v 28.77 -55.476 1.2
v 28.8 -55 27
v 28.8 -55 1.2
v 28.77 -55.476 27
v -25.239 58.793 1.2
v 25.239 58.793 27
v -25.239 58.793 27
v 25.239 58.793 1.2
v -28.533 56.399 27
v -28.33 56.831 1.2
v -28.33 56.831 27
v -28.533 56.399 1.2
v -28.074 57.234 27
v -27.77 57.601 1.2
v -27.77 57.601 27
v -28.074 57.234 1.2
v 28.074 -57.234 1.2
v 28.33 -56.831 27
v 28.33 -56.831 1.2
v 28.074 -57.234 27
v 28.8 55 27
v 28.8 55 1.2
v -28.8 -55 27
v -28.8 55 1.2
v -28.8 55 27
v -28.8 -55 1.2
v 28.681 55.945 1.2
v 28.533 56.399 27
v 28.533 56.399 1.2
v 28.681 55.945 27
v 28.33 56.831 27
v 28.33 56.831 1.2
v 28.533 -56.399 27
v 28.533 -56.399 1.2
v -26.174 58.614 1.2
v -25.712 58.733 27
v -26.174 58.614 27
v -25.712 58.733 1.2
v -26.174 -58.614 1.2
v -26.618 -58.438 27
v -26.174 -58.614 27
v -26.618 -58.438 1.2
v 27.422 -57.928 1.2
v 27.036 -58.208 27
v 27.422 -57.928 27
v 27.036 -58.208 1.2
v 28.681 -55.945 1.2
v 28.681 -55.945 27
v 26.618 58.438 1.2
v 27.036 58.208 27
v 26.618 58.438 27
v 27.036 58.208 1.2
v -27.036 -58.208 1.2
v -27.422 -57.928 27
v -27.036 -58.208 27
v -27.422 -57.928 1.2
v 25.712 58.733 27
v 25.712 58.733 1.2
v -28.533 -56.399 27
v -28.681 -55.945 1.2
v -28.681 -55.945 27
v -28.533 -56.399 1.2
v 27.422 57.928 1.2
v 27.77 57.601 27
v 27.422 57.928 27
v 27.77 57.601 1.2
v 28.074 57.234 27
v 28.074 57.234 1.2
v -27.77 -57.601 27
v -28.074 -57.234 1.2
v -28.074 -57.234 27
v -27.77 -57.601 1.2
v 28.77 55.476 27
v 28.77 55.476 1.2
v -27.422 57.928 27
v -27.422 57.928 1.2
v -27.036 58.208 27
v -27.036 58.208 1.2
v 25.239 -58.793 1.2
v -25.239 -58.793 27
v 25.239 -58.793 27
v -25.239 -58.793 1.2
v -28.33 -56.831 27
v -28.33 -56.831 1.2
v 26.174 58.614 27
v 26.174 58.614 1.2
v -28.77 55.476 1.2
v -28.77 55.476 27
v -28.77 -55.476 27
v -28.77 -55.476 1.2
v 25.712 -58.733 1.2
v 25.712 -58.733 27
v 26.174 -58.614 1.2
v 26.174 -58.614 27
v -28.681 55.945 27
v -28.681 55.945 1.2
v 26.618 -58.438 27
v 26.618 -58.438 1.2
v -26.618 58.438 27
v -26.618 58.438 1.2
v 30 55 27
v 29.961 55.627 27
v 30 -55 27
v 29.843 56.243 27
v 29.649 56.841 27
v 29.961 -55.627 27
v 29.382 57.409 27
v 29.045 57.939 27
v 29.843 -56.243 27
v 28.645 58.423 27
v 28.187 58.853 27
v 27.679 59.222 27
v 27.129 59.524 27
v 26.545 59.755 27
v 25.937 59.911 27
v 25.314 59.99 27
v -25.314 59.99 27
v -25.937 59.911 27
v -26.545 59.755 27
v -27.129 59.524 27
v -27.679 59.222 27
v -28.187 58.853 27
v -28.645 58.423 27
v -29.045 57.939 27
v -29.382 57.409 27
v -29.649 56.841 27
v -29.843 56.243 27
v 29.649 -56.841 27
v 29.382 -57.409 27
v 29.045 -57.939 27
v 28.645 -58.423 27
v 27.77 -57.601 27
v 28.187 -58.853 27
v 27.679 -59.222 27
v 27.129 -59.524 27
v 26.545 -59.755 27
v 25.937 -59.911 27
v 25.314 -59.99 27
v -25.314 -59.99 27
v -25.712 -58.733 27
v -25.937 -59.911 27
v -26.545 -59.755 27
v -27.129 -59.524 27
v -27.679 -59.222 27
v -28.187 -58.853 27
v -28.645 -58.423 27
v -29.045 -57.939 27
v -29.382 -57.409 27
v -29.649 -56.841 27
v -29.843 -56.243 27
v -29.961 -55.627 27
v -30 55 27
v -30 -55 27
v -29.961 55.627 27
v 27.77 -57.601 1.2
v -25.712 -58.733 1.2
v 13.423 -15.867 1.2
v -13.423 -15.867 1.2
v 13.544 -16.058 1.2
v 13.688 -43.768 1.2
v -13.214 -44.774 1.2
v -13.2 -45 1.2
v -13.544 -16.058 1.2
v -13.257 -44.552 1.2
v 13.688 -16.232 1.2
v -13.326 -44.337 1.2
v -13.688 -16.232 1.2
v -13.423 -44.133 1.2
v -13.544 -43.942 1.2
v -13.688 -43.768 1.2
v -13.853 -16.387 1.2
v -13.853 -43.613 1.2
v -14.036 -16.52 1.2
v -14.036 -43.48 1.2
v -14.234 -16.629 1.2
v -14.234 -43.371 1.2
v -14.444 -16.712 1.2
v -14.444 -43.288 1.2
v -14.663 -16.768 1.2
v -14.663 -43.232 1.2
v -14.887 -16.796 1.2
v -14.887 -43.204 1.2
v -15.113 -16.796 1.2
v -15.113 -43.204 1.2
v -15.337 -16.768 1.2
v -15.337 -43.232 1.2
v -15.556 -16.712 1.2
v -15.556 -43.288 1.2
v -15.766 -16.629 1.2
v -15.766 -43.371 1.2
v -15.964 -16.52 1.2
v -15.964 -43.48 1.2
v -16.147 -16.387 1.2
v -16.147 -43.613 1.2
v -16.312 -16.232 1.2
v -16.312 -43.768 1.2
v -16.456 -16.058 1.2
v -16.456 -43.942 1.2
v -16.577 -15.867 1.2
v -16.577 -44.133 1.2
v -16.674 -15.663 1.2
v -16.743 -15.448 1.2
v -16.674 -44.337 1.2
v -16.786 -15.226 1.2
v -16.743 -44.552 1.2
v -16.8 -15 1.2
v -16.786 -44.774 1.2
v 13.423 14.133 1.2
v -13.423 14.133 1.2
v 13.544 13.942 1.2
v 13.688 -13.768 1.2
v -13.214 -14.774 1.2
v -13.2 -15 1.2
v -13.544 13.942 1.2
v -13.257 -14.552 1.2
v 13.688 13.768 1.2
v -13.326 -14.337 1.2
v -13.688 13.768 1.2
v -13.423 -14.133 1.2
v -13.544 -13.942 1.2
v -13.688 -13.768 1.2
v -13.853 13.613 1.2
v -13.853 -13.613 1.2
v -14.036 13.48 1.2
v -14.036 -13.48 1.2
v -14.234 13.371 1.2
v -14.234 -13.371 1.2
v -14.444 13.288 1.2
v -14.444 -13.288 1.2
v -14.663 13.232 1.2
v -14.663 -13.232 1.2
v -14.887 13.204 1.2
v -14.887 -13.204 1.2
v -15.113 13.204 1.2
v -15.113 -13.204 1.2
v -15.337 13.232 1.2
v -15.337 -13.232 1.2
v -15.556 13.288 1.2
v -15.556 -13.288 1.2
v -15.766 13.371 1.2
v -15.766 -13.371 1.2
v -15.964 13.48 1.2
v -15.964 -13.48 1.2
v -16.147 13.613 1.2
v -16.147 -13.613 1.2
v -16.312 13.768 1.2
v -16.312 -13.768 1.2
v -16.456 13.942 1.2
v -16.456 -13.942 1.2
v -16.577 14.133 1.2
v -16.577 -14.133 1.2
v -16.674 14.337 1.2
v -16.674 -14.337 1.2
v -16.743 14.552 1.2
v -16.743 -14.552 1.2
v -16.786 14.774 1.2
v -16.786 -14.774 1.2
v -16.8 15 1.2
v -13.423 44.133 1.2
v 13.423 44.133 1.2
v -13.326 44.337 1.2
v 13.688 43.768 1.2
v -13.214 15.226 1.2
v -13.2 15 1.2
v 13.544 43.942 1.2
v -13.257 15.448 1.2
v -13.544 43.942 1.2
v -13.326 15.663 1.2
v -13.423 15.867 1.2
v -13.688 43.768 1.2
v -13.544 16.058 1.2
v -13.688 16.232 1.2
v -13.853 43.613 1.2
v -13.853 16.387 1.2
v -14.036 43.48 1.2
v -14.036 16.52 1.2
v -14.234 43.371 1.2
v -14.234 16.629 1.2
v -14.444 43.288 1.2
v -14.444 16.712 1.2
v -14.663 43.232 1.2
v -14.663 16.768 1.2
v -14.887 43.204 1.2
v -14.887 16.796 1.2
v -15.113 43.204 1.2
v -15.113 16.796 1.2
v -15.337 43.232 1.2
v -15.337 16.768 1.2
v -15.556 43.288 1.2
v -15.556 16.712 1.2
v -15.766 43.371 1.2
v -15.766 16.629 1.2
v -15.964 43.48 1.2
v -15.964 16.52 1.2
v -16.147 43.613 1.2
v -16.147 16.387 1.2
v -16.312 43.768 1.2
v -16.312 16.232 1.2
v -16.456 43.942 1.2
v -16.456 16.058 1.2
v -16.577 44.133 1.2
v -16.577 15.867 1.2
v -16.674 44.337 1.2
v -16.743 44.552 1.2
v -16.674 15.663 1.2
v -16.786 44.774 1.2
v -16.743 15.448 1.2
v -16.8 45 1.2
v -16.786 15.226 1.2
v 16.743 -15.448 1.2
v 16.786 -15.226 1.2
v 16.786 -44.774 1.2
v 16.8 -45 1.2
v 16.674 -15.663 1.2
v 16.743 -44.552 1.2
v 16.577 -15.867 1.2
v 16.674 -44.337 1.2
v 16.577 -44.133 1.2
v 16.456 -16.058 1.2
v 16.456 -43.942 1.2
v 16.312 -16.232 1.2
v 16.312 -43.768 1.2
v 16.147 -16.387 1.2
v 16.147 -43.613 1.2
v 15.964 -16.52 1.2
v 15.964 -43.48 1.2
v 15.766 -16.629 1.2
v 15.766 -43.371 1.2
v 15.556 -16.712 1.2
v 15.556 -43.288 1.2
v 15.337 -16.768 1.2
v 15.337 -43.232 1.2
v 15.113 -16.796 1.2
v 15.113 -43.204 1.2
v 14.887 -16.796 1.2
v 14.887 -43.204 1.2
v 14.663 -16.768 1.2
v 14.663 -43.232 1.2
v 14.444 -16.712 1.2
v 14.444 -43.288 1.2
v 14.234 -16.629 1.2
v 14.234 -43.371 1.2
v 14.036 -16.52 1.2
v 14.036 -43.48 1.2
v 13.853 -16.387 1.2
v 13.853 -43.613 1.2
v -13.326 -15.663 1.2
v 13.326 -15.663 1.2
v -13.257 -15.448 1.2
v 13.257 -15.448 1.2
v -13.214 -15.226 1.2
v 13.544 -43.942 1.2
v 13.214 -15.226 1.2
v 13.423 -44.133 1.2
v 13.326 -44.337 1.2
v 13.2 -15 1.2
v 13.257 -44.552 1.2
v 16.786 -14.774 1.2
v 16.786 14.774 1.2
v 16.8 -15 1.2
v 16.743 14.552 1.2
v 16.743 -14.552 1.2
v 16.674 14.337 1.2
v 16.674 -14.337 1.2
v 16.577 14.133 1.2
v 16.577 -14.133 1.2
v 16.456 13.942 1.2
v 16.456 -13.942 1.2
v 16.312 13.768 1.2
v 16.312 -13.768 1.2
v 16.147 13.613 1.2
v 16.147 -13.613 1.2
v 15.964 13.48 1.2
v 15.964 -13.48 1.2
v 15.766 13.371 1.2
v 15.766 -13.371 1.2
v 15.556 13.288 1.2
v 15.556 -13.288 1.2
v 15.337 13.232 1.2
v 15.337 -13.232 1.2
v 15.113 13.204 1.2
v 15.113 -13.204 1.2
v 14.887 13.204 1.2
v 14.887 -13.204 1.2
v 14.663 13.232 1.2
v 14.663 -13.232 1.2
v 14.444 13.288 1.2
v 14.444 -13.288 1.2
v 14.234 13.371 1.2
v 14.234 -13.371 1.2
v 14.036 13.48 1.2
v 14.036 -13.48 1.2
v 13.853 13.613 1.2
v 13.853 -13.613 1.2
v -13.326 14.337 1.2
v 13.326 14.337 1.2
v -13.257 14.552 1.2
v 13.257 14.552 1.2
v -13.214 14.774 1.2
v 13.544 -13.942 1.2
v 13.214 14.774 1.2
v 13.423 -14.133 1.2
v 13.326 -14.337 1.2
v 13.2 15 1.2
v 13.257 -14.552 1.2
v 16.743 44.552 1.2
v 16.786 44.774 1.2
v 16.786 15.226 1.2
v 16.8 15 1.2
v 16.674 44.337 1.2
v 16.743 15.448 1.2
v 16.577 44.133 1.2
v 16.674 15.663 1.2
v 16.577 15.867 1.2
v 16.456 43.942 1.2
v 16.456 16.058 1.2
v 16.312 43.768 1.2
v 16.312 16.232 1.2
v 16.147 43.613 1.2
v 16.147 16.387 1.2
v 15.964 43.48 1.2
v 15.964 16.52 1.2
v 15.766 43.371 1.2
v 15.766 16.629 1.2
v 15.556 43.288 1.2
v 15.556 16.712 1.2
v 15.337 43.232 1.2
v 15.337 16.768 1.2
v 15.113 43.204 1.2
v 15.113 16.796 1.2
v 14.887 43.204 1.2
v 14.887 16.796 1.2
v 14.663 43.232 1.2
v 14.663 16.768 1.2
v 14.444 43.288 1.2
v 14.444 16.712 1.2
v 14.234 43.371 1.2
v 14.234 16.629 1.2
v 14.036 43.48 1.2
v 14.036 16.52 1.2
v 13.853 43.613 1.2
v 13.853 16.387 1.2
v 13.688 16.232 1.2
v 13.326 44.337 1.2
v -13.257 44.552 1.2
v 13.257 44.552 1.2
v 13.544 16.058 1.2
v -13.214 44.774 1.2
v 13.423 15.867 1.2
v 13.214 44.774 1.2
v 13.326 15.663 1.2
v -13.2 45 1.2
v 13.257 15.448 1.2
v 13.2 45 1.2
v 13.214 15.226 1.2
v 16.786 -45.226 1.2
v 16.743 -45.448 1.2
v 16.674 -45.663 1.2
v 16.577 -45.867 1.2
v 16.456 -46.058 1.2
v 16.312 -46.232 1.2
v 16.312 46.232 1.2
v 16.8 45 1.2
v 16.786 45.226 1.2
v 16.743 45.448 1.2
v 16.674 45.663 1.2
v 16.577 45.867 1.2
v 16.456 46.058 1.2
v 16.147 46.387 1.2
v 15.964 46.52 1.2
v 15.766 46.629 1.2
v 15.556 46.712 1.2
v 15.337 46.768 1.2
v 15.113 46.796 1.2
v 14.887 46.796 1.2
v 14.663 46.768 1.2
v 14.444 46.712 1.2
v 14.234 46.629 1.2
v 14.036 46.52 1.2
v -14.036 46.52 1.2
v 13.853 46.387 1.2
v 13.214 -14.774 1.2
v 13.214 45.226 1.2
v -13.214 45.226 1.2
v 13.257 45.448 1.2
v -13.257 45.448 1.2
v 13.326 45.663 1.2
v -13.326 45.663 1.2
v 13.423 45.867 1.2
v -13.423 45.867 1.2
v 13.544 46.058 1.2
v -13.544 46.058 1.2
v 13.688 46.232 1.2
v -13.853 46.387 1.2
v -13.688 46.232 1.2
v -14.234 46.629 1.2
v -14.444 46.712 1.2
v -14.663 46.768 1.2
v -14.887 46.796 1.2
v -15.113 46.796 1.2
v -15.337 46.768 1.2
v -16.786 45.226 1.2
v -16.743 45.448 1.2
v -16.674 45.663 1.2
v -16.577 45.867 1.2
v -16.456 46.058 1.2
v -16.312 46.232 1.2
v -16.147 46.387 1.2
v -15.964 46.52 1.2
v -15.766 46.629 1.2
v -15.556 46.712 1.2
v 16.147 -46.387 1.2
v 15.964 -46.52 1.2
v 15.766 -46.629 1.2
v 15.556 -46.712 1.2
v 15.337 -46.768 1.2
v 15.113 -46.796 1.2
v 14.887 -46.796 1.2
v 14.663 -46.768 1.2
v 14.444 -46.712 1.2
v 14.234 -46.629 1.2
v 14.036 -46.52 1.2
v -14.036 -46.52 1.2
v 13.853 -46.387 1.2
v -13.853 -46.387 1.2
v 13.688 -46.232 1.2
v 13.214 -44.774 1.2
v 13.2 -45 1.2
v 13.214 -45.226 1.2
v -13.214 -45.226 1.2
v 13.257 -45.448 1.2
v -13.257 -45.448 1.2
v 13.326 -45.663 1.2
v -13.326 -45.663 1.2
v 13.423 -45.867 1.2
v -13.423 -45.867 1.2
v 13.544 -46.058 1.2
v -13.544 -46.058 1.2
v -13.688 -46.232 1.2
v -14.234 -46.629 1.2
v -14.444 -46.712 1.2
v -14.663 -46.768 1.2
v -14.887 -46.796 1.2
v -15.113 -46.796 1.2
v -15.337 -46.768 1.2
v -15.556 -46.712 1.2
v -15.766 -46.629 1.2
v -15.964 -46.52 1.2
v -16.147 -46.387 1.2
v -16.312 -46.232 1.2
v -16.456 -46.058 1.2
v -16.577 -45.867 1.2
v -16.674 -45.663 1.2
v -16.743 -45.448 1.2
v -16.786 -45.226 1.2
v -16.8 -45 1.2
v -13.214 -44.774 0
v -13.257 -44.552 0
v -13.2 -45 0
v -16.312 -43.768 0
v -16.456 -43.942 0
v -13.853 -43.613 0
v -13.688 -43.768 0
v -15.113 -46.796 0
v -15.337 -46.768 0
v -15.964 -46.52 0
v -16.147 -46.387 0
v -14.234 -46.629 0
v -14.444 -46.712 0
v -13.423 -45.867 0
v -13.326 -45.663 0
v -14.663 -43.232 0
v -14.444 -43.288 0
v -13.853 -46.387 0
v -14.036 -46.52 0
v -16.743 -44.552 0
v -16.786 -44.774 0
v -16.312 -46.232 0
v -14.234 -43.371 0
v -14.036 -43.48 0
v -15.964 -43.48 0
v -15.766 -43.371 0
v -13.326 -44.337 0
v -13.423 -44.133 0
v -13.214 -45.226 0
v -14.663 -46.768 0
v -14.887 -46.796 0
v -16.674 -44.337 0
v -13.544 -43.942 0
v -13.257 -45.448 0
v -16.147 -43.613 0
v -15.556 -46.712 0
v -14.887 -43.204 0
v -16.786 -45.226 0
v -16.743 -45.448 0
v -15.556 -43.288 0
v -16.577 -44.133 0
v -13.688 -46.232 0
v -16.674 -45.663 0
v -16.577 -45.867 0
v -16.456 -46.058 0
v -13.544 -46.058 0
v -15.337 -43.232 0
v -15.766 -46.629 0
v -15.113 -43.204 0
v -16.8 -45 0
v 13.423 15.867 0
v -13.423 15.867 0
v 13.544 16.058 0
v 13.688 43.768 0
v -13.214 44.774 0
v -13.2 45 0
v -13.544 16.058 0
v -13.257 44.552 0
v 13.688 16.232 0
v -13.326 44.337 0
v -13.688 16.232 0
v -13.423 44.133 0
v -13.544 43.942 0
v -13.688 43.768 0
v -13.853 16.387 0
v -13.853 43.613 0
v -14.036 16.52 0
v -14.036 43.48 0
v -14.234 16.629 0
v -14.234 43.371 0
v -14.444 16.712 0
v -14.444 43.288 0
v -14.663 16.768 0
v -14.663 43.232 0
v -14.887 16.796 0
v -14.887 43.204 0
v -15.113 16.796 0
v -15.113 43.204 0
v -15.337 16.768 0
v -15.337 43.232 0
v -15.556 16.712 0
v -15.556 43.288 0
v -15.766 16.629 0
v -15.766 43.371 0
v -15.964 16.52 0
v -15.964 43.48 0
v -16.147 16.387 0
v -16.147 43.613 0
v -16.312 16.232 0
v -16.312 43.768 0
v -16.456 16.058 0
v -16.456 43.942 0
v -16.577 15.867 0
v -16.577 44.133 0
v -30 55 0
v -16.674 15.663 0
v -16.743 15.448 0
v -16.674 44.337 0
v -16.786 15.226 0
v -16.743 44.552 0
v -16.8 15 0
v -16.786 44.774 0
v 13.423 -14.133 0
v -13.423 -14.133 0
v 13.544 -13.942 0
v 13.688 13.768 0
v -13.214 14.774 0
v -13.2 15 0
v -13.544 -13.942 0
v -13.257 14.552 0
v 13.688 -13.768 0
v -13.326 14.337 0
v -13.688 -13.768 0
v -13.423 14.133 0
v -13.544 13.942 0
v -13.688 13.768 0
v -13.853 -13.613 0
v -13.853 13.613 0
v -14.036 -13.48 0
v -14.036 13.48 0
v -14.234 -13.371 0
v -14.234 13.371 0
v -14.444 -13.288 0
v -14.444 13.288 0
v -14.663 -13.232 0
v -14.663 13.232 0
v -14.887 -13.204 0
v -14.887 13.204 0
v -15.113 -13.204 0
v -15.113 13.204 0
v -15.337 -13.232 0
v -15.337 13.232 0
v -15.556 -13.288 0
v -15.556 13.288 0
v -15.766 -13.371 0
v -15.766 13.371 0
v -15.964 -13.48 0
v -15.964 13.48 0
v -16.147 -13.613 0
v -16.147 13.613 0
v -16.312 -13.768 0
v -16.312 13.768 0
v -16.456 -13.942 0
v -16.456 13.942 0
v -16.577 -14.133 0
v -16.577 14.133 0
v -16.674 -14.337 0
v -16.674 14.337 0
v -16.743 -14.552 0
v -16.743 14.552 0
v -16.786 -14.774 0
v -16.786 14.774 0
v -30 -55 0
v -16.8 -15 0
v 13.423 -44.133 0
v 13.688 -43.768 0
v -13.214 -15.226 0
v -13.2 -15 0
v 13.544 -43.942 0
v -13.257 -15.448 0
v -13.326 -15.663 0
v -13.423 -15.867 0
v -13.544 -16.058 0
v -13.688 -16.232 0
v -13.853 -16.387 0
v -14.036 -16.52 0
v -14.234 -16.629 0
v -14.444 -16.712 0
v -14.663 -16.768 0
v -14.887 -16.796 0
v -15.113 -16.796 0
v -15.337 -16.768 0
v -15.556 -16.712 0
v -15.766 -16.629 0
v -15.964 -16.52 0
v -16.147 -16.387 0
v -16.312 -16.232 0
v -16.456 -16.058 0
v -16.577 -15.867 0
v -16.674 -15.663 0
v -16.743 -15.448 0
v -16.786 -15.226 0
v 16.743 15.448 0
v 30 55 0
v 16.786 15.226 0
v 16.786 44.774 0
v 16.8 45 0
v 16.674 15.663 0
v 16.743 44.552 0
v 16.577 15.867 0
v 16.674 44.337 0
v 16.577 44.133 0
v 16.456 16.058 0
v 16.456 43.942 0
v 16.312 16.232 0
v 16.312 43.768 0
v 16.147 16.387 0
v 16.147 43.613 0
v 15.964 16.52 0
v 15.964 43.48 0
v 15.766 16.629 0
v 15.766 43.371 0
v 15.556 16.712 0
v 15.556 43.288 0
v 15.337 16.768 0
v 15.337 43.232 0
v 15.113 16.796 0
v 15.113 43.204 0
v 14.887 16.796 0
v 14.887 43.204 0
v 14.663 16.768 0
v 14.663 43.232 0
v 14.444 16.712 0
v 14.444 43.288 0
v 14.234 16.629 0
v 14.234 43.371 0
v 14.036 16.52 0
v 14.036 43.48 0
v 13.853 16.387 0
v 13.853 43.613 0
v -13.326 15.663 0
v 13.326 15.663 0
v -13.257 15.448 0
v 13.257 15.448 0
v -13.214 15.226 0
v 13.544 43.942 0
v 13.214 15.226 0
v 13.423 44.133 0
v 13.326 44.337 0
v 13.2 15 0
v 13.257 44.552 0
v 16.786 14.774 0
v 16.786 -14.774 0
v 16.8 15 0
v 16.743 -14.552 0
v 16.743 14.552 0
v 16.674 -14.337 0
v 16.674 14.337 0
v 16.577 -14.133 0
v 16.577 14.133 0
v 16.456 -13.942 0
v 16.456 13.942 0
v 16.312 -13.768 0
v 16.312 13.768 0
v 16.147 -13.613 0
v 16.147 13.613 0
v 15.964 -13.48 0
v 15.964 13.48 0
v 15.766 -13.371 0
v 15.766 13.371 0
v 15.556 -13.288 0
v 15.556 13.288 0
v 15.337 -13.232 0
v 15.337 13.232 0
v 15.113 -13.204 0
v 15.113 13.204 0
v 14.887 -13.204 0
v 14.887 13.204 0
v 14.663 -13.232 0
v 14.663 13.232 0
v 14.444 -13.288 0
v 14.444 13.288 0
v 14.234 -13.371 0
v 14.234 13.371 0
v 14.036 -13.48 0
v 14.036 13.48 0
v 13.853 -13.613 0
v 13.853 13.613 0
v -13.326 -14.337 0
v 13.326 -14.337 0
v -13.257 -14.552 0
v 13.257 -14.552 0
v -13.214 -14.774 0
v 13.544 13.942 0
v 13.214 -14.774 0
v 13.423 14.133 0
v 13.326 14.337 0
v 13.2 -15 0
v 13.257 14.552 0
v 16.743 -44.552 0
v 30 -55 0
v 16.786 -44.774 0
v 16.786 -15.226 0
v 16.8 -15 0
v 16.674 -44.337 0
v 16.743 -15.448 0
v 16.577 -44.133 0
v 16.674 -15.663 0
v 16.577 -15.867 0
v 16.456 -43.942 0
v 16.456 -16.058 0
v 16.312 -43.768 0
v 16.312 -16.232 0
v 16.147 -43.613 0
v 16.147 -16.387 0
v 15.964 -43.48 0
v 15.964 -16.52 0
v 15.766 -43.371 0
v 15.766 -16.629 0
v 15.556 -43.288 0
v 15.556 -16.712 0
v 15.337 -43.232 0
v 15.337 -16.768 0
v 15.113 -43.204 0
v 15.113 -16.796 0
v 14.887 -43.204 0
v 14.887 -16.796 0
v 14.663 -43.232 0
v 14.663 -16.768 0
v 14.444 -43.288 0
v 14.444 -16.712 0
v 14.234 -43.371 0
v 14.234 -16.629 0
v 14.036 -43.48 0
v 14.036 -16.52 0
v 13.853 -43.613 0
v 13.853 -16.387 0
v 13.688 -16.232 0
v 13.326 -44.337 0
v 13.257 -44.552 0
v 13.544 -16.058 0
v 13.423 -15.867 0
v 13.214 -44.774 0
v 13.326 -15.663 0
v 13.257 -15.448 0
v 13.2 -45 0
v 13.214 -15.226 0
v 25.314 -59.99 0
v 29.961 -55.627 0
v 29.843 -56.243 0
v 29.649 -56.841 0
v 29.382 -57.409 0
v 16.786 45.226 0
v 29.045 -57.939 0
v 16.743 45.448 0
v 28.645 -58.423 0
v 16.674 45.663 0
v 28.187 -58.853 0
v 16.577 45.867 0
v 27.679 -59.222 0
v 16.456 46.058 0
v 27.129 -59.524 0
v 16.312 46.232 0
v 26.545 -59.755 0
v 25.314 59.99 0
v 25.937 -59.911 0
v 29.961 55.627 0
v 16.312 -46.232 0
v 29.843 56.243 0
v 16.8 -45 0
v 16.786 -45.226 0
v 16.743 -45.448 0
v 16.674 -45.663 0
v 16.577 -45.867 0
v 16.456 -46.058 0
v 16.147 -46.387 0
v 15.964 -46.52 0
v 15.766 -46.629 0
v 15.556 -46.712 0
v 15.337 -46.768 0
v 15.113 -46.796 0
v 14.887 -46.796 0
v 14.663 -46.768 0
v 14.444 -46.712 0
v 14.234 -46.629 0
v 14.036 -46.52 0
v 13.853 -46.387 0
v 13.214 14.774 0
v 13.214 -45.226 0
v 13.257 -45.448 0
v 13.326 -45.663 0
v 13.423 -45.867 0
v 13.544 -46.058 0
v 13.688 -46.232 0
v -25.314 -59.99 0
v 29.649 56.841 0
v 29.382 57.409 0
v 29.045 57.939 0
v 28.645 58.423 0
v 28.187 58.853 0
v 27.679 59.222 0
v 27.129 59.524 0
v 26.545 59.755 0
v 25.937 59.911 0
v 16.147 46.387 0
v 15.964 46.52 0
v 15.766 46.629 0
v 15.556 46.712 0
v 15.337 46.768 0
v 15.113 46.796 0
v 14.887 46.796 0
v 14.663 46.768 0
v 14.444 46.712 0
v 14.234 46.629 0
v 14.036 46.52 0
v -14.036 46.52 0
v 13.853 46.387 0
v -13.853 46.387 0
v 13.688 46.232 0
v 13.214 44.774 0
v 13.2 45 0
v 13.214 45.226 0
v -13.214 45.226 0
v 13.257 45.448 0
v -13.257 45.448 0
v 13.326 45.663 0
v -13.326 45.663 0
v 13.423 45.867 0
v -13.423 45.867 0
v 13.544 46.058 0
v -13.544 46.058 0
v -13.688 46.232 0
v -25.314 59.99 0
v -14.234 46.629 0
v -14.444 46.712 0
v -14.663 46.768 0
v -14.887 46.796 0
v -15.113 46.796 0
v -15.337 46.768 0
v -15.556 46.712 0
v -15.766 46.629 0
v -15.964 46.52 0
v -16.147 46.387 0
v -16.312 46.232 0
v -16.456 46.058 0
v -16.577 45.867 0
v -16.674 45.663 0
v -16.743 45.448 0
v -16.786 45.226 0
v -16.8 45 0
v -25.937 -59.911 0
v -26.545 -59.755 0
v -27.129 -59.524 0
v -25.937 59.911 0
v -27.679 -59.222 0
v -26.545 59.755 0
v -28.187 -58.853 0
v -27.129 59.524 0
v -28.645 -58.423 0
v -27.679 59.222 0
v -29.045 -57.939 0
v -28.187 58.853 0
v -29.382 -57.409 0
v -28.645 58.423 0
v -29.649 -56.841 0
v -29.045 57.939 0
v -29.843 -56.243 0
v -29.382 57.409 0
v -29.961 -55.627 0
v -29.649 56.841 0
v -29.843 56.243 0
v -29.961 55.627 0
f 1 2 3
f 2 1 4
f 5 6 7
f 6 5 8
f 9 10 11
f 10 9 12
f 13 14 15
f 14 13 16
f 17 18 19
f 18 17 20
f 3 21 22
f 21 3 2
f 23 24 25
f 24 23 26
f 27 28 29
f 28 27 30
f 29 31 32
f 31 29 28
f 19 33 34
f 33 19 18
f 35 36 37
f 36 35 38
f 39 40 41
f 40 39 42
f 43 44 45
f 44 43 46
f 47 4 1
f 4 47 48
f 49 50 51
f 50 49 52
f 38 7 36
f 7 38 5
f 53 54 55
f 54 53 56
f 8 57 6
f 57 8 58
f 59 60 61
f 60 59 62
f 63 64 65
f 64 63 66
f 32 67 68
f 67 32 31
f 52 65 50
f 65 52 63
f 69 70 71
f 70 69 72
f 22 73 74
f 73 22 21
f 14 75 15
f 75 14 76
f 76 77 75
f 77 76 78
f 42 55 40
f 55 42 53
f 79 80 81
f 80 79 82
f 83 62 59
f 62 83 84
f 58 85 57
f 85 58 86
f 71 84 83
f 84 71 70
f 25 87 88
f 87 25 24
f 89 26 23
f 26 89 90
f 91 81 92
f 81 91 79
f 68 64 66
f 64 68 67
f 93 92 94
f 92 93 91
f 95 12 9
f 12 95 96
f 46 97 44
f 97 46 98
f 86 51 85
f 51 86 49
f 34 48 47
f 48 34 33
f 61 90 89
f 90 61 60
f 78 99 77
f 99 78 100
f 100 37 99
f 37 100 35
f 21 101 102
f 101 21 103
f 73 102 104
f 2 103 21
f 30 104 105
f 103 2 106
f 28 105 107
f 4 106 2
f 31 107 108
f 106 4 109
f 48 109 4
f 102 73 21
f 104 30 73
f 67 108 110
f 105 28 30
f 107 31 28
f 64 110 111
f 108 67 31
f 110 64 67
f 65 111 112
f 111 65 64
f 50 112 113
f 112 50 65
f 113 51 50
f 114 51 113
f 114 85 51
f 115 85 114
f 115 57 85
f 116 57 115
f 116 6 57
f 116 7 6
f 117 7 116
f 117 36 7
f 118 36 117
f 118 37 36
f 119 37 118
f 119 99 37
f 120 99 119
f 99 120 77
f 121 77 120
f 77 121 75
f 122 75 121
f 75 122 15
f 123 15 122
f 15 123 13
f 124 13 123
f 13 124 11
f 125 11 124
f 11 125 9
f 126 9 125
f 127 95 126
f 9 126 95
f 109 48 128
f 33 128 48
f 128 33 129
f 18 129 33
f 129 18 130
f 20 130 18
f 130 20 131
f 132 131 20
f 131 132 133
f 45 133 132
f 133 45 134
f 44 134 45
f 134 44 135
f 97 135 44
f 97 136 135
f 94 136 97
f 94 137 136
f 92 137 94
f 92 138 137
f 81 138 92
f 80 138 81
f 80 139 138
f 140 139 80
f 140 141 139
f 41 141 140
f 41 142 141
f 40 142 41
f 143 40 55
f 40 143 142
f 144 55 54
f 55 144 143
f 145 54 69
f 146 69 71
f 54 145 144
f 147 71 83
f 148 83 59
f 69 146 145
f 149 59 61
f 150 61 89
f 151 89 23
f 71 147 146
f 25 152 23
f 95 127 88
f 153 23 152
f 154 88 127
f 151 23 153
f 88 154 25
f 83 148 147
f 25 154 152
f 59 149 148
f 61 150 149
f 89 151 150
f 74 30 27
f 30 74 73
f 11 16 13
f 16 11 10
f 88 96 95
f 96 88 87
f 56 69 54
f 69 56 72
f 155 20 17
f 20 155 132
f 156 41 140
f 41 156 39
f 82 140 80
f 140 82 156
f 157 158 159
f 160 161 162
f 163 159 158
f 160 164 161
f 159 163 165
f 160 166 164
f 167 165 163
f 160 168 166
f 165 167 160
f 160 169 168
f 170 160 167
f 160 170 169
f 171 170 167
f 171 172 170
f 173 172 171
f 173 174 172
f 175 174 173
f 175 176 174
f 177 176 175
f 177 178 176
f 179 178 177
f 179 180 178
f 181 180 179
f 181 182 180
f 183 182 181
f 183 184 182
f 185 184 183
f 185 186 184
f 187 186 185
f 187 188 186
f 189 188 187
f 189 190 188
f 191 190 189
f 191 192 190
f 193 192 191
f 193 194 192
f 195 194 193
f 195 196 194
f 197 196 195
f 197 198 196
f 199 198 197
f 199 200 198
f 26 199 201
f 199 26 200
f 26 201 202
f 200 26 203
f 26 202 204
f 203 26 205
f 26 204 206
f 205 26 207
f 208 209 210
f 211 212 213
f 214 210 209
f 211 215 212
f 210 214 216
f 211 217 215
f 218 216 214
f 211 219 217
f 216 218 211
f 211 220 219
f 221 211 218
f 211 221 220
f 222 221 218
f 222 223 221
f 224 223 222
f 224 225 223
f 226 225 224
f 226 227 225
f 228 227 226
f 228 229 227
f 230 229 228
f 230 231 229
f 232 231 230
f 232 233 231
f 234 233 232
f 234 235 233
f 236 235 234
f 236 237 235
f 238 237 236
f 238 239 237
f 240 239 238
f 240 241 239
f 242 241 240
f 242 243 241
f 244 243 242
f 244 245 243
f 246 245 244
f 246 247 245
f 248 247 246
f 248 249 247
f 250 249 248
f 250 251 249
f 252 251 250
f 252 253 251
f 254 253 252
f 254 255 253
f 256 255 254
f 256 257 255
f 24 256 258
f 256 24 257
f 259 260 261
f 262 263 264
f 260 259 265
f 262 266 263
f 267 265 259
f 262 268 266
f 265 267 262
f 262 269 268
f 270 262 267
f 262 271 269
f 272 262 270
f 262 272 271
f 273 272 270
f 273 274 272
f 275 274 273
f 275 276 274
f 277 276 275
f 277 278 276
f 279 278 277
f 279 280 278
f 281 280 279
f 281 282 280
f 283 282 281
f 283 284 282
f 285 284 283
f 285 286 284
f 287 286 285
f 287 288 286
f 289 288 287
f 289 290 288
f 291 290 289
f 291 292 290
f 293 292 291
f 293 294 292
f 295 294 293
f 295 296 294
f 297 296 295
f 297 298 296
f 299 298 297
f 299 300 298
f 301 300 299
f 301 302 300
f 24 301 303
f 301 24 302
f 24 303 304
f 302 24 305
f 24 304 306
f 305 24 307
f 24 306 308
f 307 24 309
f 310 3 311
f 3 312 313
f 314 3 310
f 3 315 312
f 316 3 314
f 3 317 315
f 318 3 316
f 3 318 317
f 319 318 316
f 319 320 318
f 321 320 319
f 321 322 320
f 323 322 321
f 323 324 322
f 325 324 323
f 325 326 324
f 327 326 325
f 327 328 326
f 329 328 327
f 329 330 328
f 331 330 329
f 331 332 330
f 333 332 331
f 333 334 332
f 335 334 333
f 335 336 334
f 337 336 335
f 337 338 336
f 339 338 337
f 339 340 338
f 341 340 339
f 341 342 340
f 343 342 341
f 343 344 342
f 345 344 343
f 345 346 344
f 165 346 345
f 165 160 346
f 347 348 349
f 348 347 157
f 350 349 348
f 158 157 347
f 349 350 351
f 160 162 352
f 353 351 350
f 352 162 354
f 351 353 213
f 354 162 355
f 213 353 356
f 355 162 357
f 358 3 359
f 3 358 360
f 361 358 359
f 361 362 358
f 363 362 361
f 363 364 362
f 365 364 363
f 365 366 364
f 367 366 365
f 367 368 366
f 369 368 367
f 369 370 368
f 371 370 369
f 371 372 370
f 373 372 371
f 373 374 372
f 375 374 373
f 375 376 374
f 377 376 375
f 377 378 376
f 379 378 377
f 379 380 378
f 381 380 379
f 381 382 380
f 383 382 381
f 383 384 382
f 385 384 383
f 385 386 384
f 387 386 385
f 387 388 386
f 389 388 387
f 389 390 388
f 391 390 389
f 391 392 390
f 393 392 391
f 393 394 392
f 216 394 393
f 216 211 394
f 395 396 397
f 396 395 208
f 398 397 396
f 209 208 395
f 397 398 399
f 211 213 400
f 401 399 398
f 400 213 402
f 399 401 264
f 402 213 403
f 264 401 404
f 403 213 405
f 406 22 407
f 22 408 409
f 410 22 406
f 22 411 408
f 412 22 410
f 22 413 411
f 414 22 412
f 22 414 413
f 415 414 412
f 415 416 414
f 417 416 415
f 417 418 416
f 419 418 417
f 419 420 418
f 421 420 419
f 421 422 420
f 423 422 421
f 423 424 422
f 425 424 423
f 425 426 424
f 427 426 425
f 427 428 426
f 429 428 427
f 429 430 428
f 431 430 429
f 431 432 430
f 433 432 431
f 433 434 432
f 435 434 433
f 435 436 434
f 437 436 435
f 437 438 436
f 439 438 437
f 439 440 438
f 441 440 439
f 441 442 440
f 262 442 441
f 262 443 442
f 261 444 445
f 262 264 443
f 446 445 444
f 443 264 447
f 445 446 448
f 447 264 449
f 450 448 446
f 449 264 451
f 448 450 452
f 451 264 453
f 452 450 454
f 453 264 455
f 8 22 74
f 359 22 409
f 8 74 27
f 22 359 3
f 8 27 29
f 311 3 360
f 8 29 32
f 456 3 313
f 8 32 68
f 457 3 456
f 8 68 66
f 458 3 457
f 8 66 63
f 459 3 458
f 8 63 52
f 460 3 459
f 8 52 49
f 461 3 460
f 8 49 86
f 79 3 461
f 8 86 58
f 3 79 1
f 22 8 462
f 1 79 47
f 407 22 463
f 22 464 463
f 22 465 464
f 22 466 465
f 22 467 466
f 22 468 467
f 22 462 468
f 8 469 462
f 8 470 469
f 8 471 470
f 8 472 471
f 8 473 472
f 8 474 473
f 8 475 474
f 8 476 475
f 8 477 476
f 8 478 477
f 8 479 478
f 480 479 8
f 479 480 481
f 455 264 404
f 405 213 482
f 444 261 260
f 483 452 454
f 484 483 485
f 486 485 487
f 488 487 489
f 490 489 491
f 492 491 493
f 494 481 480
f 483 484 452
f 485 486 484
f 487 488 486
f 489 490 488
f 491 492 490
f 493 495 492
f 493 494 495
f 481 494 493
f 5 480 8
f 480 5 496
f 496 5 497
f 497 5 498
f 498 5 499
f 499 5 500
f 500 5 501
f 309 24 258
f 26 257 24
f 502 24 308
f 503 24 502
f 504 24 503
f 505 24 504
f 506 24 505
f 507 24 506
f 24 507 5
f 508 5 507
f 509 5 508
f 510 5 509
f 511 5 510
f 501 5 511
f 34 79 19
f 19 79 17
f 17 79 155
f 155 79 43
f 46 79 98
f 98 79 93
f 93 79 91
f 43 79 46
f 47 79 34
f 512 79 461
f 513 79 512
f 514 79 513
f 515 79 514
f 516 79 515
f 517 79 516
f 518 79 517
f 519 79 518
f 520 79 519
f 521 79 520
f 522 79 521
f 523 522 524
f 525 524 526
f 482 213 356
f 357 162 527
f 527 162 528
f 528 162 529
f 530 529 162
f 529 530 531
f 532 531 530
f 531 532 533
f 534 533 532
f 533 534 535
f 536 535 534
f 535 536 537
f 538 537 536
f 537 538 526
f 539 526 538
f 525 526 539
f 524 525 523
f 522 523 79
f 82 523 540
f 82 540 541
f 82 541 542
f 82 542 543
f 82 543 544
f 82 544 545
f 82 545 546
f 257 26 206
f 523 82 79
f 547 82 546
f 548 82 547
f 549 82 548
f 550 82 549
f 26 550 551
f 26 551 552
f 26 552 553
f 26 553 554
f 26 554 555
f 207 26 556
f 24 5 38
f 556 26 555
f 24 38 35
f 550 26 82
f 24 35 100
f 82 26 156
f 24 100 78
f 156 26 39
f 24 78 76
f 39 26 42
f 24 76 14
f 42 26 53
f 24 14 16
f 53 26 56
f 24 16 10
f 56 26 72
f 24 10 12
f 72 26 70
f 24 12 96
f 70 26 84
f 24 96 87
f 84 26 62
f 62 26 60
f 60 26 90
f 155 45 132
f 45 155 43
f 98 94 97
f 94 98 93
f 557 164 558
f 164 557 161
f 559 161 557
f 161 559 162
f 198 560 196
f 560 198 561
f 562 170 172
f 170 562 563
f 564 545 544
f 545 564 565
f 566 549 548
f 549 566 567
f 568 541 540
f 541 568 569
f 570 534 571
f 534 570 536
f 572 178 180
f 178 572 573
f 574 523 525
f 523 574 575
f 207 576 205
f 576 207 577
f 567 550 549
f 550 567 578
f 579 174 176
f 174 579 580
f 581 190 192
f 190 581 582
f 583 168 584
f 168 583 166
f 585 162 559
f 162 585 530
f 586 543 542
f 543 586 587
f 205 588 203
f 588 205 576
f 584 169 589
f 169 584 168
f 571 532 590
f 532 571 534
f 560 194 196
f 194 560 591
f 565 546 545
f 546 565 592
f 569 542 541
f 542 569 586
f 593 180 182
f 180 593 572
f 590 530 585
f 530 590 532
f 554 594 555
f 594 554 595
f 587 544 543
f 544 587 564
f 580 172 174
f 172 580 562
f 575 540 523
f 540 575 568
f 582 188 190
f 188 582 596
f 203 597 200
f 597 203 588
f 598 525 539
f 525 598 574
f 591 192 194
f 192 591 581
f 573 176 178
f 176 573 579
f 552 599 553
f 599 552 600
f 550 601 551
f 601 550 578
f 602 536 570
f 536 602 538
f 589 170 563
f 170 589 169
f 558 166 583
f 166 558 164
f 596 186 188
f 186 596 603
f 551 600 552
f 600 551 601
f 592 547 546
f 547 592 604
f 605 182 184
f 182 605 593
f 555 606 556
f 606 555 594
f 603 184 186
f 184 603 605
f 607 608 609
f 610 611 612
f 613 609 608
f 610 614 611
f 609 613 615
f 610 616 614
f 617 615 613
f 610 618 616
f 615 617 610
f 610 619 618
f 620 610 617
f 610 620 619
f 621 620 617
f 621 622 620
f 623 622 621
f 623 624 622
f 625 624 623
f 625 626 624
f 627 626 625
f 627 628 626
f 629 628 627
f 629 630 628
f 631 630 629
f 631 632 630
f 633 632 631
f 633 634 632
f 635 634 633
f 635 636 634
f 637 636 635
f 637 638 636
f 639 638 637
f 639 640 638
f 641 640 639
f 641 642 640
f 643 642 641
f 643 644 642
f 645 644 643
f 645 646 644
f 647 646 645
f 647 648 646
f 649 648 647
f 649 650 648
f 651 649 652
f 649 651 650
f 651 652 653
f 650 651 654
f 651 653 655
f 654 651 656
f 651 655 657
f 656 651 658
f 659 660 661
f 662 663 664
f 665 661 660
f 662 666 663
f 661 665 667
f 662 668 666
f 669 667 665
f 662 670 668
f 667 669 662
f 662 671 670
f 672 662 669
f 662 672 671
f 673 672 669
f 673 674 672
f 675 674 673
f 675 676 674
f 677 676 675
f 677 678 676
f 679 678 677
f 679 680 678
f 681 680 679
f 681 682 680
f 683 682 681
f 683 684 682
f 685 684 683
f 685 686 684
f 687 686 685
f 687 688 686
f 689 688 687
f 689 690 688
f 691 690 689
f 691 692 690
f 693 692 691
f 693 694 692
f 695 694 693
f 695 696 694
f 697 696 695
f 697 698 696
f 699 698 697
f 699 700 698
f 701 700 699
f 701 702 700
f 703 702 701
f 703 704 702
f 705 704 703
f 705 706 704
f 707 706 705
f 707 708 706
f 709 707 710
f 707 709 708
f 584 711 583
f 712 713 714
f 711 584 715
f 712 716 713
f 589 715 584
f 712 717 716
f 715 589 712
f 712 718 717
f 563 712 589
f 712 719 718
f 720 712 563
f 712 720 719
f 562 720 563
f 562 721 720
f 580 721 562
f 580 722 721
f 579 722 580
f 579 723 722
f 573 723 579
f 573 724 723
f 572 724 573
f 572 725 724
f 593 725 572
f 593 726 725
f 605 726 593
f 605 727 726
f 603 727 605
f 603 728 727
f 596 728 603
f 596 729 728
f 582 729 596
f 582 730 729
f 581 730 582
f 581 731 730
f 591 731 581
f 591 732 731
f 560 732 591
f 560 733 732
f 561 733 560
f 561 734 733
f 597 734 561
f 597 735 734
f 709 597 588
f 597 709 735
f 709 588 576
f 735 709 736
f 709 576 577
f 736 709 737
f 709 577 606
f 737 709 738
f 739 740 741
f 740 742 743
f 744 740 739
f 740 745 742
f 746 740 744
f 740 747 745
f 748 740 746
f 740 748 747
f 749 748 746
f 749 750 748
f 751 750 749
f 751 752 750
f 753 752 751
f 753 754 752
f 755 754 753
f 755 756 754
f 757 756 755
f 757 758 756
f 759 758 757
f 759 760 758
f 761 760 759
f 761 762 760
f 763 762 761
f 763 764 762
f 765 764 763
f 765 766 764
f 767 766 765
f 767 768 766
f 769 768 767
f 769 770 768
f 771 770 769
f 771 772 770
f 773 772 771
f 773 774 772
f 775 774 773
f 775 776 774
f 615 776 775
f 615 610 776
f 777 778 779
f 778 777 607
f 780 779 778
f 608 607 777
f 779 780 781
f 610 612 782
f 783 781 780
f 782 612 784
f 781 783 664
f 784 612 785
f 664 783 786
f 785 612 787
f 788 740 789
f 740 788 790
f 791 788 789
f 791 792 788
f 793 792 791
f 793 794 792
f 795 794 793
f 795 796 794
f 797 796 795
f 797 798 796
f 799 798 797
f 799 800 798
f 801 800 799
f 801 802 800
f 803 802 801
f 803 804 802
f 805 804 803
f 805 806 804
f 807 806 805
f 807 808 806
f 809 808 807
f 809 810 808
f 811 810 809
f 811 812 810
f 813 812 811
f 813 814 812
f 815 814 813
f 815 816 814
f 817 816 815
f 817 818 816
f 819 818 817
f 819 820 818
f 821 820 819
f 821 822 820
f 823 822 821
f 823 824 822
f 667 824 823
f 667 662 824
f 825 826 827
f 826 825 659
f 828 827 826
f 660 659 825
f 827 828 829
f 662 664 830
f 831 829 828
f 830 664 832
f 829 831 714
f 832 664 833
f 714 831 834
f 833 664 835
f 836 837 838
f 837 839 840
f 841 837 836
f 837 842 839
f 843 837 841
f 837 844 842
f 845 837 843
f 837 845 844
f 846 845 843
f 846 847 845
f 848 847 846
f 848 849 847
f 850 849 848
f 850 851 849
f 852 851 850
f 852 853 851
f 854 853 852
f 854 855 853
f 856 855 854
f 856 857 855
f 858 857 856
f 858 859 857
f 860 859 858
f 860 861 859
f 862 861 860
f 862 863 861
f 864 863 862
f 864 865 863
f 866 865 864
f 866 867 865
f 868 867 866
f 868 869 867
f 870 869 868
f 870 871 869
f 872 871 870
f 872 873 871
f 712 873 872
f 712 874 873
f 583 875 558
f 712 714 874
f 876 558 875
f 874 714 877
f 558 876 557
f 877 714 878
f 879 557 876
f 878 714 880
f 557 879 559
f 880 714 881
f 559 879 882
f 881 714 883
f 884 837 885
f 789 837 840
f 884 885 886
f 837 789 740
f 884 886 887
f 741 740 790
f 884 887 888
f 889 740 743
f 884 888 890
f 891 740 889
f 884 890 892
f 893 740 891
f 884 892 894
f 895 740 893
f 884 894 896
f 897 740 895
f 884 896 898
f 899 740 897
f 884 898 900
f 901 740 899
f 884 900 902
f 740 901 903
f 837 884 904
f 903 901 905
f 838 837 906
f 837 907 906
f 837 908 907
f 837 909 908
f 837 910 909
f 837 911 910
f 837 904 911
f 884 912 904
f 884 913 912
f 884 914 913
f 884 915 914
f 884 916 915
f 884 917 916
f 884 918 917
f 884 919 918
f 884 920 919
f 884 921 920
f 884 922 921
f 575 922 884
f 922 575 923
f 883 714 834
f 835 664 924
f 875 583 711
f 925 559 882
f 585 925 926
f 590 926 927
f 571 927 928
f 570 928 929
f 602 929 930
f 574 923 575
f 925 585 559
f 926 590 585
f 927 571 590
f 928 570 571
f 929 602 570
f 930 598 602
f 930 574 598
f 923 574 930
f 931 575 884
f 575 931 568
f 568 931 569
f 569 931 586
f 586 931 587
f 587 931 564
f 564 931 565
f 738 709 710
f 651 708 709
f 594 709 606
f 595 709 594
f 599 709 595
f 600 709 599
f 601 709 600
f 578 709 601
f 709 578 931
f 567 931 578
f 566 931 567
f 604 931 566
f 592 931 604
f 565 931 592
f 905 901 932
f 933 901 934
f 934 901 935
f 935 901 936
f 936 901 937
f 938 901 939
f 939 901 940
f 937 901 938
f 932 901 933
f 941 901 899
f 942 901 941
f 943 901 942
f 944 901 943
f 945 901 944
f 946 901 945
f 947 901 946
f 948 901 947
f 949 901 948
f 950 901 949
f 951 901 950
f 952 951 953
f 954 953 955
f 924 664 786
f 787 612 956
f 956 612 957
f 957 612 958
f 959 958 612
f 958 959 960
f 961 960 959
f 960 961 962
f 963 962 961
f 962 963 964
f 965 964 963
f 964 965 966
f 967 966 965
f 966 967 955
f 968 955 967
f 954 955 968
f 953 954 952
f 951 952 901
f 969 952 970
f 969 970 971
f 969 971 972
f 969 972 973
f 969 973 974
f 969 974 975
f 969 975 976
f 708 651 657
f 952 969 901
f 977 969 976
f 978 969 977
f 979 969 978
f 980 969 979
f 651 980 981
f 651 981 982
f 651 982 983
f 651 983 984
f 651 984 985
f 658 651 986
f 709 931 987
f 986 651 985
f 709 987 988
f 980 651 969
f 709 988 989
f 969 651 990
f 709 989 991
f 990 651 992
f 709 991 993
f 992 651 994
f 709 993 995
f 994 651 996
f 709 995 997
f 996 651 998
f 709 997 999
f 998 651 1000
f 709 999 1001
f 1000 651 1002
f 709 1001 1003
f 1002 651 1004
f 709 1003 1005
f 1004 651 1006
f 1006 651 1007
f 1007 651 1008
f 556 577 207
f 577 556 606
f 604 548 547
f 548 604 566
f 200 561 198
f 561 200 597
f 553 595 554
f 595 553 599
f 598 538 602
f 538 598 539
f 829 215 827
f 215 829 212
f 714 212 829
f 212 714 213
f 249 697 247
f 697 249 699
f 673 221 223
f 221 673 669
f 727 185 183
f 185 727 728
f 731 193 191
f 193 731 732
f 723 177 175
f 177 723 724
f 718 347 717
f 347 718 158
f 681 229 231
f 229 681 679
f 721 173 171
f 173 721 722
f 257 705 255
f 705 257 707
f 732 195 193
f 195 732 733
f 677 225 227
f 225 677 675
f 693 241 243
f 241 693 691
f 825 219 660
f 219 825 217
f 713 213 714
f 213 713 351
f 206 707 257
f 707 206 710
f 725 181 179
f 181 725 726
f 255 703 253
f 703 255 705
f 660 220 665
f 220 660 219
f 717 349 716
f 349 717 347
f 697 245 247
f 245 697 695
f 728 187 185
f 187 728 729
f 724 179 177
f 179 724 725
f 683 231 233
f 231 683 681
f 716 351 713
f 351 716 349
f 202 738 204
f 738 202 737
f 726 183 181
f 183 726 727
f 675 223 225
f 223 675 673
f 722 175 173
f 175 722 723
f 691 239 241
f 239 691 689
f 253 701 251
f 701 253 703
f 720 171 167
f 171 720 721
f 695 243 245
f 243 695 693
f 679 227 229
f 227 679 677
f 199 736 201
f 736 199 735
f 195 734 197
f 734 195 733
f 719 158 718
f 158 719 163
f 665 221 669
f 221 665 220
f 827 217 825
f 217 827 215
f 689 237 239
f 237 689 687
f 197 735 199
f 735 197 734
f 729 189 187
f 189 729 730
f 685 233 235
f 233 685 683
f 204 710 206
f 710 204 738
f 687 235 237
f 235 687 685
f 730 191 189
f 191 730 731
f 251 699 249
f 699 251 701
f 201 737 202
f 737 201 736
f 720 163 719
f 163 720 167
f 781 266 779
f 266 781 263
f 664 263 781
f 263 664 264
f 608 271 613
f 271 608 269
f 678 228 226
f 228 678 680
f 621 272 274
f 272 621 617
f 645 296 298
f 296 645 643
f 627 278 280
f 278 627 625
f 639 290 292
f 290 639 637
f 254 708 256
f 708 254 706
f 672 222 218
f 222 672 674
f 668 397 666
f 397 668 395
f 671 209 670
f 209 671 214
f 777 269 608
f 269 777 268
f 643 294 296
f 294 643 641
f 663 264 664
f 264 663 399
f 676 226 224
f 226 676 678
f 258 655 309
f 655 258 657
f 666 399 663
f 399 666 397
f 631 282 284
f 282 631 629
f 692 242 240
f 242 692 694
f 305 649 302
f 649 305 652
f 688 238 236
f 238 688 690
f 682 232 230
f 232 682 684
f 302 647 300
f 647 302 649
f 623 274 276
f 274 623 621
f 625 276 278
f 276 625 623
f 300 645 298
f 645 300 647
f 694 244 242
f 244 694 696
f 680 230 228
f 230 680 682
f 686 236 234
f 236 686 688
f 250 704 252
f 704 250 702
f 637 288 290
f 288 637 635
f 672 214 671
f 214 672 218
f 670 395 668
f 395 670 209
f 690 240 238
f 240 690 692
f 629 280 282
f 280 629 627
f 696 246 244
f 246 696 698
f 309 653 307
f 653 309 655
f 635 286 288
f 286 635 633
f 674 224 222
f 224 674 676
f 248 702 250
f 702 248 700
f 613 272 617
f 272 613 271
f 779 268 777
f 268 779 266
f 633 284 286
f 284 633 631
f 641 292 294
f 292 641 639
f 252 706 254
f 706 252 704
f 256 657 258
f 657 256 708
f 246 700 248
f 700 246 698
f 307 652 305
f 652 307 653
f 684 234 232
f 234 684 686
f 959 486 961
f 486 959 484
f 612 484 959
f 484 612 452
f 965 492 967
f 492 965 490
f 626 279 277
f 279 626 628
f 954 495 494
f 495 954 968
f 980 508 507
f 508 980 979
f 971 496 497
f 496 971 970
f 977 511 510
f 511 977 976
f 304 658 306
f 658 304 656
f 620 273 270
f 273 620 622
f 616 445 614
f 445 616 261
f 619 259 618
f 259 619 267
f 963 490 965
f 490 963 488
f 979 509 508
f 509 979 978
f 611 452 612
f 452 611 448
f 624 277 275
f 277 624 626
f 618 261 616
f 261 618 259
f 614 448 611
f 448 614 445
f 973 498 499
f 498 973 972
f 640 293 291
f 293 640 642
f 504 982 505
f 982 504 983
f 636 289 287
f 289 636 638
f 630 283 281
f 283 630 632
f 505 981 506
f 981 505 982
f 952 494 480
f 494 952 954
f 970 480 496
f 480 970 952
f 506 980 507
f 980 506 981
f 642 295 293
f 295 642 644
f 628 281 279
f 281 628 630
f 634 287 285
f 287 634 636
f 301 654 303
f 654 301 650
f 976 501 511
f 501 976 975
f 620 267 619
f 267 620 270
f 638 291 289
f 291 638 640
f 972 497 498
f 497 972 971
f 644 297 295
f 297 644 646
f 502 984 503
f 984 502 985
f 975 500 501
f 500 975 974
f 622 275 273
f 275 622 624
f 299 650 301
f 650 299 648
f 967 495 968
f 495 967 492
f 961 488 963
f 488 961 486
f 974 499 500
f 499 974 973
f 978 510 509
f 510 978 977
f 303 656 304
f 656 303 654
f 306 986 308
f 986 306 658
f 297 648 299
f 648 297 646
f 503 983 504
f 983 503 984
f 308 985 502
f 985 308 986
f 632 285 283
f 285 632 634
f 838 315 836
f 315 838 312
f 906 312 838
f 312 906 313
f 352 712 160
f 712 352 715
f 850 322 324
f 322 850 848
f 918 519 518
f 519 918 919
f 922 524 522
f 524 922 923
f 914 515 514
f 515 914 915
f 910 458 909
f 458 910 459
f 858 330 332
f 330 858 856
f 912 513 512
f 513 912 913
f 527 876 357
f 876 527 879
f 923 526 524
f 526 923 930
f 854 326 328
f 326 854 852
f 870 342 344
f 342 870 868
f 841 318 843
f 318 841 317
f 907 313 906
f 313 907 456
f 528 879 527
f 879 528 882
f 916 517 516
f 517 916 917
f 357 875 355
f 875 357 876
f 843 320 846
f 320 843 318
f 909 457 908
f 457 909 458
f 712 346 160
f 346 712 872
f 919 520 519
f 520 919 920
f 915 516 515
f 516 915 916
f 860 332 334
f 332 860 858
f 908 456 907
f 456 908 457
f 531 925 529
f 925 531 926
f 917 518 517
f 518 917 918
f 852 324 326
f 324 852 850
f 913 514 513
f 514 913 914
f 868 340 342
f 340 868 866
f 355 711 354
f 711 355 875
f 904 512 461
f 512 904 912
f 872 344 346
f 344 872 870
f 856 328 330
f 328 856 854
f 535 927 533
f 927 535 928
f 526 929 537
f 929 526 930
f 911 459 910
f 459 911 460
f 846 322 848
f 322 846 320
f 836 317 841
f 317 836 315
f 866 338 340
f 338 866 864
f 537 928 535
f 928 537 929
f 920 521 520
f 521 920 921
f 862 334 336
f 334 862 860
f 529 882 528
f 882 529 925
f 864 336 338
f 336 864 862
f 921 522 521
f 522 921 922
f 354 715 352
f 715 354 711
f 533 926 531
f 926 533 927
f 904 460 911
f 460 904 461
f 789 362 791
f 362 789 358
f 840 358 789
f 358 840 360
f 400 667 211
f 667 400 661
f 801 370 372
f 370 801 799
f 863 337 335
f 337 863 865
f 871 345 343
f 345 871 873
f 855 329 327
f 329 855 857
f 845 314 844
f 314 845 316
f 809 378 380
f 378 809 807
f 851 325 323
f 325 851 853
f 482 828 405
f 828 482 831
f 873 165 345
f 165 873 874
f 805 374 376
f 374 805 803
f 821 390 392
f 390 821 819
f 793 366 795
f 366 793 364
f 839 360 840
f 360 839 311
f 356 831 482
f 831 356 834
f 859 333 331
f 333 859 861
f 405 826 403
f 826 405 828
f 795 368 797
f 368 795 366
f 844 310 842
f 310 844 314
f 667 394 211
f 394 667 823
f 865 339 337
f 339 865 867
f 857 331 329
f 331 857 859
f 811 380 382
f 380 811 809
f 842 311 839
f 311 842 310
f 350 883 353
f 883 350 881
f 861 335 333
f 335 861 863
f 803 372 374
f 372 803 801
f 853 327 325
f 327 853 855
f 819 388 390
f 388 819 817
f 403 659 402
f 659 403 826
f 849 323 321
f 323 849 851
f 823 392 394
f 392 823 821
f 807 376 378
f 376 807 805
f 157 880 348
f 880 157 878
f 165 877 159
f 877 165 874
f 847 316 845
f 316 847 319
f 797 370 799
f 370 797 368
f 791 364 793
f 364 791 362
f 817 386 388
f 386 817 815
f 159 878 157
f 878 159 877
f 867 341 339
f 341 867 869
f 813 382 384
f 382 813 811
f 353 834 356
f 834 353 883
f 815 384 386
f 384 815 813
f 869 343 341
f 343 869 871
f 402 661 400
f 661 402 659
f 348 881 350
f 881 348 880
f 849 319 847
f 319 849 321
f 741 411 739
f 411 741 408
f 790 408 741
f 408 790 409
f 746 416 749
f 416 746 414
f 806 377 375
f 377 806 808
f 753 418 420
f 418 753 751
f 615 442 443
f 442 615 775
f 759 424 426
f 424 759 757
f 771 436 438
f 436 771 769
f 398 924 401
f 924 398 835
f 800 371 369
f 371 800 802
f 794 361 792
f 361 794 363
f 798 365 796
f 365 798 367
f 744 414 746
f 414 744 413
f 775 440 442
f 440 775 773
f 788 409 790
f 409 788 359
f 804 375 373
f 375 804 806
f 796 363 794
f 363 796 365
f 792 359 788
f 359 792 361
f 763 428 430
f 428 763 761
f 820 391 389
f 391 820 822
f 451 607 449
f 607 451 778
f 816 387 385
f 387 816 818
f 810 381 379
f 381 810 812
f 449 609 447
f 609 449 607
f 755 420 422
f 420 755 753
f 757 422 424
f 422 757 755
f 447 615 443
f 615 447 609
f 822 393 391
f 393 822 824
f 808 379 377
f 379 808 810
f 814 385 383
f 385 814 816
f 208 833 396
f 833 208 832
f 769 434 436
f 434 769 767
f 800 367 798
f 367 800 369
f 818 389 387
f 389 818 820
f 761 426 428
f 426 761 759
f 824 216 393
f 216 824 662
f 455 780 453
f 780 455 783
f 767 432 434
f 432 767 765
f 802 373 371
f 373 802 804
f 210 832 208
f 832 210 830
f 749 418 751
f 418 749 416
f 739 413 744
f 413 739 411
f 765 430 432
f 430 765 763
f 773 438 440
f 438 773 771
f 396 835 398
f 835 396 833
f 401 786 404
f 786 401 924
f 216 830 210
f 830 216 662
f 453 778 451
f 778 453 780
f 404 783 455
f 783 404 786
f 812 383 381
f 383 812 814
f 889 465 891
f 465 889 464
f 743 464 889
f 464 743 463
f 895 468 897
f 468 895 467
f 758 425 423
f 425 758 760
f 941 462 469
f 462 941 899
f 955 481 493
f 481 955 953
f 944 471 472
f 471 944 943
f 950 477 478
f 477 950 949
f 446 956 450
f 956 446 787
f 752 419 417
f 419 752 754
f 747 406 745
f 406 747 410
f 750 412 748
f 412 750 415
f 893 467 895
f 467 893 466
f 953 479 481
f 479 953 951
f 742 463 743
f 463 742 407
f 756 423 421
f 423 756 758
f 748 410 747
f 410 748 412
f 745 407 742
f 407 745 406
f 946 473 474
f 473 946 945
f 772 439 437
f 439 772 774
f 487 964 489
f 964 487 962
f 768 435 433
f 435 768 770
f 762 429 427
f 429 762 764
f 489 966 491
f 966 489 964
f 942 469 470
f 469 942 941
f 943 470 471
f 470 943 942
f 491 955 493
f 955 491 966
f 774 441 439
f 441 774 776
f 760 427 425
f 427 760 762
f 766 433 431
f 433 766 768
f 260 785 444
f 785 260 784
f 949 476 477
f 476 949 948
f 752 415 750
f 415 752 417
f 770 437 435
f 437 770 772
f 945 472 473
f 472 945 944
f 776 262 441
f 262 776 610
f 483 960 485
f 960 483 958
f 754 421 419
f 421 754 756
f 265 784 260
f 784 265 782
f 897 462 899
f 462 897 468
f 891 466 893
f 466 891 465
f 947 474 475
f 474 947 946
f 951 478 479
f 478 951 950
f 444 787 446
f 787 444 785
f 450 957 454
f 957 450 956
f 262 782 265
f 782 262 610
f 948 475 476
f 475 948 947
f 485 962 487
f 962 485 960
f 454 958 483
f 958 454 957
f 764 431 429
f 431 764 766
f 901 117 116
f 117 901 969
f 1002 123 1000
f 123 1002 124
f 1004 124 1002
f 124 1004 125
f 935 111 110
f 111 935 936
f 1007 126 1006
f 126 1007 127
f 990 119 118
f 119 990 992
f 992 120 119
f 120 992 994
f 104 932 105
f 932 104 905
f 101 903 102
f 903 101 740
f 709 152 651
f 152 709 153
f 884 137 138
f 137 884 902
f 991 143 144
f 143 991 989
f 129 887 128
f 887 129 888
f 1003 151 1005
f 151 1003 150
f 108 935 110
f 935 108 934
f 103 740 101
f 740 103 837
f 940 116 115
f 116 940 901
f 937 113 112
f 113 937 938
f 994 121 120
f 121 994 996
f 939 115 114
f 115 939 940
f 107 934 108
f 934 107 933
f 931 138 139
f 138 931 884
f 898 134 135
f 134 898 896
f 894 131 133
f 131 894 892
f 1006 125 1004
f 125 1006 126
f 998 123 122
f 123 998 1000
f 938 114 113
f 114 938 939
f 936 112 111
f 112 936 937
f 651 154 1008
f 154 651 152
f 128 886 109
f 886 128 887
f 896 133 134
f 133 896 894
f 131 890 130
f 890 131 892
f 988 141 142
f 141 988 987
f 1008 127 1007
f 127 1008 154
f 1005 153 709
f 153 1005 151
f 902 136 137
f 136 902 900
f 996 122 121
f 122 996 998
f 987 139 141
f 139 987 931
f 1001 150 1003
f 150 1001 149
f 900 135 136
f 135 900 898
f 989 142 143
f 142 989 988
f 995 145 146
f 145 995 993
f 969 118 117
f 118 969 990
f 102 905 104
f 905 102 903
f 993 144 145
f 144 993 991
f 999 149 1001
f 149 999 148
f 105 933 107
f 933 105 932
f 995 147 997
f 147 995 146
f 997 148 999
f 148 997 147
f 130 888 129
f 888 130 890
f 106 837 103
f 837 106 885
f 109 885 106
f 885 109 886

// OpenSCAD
$fn = 50;


difference() {
	union() {
		hull() {
			translate(v = [-25.0000000000, 55.0000000000, 0]) {
				cylinder(h = 27, r = 5);
			}
			translate(v = [25.0000000000, 55.0000000000, 0]) {
				cylinder(h = 27, r = 5);
			}
			translate(v = [-25.0000000000, -55.0000000000, 0]) {
				cylinder(h = 27, r = 5);
			}
			translate(v = [25.0000000000, -55.0000000000, 0]) {
				cylinder(h = 27, r = 5);
			}
		}
	}
	union() {
		translate(v = [0, 0, 1.2000000000]) {
			hull() {
				translate(v = [-25.0000000000, 55.0000000000, 0]) {
					cylinder(h = 25.8000000000, r = 3.8000000000);
				}
				translate(v = [25.0000000000, 55.0000000000, 0]) {
					cylinder(h = 25.8000000000, r = 3.8000000000);
				}
				translate(v = [-25.0000000000, -55.0000000000, 0]) {
					cylinder(h = 25.8000000000, r = 3.8000000000);
				}
				translate(v = [25.0000000000, -55.0000000000, 0]) {
					cylinder(h = 25.8000000000, r = 3.8000000000);
				}
			}
		}
		#translate(v = [-15.0000000000, -45.0000000000, 0]) {
			cylinder(h = 1.2000000000, r = 1.8000000000);
		}
		#translate(v = [-15.0000000000, -15.0000000000, 0]) {
			cylinder(h = 1.2000000000, r = 1.8000000000);
		}
		#translate(v = [-15.0000000000, 15.0000000000, 0]) {
			cylinder(h = 1.2000000000, r = 1.8000000000);
		}
		#translate(v = [-15.0000000000, 45.0000000000, 0]) {
			cylinder(h = 1.2000000000, r = 1.8000000000);
		}
		#translate(v = [15.0000000000, -45.0000000000, 0]) {
			cylinder(h = 1.2000000000, r = 1.8000000000);
		}
		#translate(v = [15.0000000000, -15.0000000000, 0]) {
			cylinder(h = 1.2000000000, r = 1.8000000000);
		}
		#translate(v = [15.0000000000, 15.0000000000, 0]) {
			cylinder(h = 1.2000000000, r = 1.8000000000);
		}
		#translate(v = [15.0000000000, 45.0000000000, 0]) {
			cylinder(h = 1.2000000000, r = 1.8000000000);
		}
	}
}
